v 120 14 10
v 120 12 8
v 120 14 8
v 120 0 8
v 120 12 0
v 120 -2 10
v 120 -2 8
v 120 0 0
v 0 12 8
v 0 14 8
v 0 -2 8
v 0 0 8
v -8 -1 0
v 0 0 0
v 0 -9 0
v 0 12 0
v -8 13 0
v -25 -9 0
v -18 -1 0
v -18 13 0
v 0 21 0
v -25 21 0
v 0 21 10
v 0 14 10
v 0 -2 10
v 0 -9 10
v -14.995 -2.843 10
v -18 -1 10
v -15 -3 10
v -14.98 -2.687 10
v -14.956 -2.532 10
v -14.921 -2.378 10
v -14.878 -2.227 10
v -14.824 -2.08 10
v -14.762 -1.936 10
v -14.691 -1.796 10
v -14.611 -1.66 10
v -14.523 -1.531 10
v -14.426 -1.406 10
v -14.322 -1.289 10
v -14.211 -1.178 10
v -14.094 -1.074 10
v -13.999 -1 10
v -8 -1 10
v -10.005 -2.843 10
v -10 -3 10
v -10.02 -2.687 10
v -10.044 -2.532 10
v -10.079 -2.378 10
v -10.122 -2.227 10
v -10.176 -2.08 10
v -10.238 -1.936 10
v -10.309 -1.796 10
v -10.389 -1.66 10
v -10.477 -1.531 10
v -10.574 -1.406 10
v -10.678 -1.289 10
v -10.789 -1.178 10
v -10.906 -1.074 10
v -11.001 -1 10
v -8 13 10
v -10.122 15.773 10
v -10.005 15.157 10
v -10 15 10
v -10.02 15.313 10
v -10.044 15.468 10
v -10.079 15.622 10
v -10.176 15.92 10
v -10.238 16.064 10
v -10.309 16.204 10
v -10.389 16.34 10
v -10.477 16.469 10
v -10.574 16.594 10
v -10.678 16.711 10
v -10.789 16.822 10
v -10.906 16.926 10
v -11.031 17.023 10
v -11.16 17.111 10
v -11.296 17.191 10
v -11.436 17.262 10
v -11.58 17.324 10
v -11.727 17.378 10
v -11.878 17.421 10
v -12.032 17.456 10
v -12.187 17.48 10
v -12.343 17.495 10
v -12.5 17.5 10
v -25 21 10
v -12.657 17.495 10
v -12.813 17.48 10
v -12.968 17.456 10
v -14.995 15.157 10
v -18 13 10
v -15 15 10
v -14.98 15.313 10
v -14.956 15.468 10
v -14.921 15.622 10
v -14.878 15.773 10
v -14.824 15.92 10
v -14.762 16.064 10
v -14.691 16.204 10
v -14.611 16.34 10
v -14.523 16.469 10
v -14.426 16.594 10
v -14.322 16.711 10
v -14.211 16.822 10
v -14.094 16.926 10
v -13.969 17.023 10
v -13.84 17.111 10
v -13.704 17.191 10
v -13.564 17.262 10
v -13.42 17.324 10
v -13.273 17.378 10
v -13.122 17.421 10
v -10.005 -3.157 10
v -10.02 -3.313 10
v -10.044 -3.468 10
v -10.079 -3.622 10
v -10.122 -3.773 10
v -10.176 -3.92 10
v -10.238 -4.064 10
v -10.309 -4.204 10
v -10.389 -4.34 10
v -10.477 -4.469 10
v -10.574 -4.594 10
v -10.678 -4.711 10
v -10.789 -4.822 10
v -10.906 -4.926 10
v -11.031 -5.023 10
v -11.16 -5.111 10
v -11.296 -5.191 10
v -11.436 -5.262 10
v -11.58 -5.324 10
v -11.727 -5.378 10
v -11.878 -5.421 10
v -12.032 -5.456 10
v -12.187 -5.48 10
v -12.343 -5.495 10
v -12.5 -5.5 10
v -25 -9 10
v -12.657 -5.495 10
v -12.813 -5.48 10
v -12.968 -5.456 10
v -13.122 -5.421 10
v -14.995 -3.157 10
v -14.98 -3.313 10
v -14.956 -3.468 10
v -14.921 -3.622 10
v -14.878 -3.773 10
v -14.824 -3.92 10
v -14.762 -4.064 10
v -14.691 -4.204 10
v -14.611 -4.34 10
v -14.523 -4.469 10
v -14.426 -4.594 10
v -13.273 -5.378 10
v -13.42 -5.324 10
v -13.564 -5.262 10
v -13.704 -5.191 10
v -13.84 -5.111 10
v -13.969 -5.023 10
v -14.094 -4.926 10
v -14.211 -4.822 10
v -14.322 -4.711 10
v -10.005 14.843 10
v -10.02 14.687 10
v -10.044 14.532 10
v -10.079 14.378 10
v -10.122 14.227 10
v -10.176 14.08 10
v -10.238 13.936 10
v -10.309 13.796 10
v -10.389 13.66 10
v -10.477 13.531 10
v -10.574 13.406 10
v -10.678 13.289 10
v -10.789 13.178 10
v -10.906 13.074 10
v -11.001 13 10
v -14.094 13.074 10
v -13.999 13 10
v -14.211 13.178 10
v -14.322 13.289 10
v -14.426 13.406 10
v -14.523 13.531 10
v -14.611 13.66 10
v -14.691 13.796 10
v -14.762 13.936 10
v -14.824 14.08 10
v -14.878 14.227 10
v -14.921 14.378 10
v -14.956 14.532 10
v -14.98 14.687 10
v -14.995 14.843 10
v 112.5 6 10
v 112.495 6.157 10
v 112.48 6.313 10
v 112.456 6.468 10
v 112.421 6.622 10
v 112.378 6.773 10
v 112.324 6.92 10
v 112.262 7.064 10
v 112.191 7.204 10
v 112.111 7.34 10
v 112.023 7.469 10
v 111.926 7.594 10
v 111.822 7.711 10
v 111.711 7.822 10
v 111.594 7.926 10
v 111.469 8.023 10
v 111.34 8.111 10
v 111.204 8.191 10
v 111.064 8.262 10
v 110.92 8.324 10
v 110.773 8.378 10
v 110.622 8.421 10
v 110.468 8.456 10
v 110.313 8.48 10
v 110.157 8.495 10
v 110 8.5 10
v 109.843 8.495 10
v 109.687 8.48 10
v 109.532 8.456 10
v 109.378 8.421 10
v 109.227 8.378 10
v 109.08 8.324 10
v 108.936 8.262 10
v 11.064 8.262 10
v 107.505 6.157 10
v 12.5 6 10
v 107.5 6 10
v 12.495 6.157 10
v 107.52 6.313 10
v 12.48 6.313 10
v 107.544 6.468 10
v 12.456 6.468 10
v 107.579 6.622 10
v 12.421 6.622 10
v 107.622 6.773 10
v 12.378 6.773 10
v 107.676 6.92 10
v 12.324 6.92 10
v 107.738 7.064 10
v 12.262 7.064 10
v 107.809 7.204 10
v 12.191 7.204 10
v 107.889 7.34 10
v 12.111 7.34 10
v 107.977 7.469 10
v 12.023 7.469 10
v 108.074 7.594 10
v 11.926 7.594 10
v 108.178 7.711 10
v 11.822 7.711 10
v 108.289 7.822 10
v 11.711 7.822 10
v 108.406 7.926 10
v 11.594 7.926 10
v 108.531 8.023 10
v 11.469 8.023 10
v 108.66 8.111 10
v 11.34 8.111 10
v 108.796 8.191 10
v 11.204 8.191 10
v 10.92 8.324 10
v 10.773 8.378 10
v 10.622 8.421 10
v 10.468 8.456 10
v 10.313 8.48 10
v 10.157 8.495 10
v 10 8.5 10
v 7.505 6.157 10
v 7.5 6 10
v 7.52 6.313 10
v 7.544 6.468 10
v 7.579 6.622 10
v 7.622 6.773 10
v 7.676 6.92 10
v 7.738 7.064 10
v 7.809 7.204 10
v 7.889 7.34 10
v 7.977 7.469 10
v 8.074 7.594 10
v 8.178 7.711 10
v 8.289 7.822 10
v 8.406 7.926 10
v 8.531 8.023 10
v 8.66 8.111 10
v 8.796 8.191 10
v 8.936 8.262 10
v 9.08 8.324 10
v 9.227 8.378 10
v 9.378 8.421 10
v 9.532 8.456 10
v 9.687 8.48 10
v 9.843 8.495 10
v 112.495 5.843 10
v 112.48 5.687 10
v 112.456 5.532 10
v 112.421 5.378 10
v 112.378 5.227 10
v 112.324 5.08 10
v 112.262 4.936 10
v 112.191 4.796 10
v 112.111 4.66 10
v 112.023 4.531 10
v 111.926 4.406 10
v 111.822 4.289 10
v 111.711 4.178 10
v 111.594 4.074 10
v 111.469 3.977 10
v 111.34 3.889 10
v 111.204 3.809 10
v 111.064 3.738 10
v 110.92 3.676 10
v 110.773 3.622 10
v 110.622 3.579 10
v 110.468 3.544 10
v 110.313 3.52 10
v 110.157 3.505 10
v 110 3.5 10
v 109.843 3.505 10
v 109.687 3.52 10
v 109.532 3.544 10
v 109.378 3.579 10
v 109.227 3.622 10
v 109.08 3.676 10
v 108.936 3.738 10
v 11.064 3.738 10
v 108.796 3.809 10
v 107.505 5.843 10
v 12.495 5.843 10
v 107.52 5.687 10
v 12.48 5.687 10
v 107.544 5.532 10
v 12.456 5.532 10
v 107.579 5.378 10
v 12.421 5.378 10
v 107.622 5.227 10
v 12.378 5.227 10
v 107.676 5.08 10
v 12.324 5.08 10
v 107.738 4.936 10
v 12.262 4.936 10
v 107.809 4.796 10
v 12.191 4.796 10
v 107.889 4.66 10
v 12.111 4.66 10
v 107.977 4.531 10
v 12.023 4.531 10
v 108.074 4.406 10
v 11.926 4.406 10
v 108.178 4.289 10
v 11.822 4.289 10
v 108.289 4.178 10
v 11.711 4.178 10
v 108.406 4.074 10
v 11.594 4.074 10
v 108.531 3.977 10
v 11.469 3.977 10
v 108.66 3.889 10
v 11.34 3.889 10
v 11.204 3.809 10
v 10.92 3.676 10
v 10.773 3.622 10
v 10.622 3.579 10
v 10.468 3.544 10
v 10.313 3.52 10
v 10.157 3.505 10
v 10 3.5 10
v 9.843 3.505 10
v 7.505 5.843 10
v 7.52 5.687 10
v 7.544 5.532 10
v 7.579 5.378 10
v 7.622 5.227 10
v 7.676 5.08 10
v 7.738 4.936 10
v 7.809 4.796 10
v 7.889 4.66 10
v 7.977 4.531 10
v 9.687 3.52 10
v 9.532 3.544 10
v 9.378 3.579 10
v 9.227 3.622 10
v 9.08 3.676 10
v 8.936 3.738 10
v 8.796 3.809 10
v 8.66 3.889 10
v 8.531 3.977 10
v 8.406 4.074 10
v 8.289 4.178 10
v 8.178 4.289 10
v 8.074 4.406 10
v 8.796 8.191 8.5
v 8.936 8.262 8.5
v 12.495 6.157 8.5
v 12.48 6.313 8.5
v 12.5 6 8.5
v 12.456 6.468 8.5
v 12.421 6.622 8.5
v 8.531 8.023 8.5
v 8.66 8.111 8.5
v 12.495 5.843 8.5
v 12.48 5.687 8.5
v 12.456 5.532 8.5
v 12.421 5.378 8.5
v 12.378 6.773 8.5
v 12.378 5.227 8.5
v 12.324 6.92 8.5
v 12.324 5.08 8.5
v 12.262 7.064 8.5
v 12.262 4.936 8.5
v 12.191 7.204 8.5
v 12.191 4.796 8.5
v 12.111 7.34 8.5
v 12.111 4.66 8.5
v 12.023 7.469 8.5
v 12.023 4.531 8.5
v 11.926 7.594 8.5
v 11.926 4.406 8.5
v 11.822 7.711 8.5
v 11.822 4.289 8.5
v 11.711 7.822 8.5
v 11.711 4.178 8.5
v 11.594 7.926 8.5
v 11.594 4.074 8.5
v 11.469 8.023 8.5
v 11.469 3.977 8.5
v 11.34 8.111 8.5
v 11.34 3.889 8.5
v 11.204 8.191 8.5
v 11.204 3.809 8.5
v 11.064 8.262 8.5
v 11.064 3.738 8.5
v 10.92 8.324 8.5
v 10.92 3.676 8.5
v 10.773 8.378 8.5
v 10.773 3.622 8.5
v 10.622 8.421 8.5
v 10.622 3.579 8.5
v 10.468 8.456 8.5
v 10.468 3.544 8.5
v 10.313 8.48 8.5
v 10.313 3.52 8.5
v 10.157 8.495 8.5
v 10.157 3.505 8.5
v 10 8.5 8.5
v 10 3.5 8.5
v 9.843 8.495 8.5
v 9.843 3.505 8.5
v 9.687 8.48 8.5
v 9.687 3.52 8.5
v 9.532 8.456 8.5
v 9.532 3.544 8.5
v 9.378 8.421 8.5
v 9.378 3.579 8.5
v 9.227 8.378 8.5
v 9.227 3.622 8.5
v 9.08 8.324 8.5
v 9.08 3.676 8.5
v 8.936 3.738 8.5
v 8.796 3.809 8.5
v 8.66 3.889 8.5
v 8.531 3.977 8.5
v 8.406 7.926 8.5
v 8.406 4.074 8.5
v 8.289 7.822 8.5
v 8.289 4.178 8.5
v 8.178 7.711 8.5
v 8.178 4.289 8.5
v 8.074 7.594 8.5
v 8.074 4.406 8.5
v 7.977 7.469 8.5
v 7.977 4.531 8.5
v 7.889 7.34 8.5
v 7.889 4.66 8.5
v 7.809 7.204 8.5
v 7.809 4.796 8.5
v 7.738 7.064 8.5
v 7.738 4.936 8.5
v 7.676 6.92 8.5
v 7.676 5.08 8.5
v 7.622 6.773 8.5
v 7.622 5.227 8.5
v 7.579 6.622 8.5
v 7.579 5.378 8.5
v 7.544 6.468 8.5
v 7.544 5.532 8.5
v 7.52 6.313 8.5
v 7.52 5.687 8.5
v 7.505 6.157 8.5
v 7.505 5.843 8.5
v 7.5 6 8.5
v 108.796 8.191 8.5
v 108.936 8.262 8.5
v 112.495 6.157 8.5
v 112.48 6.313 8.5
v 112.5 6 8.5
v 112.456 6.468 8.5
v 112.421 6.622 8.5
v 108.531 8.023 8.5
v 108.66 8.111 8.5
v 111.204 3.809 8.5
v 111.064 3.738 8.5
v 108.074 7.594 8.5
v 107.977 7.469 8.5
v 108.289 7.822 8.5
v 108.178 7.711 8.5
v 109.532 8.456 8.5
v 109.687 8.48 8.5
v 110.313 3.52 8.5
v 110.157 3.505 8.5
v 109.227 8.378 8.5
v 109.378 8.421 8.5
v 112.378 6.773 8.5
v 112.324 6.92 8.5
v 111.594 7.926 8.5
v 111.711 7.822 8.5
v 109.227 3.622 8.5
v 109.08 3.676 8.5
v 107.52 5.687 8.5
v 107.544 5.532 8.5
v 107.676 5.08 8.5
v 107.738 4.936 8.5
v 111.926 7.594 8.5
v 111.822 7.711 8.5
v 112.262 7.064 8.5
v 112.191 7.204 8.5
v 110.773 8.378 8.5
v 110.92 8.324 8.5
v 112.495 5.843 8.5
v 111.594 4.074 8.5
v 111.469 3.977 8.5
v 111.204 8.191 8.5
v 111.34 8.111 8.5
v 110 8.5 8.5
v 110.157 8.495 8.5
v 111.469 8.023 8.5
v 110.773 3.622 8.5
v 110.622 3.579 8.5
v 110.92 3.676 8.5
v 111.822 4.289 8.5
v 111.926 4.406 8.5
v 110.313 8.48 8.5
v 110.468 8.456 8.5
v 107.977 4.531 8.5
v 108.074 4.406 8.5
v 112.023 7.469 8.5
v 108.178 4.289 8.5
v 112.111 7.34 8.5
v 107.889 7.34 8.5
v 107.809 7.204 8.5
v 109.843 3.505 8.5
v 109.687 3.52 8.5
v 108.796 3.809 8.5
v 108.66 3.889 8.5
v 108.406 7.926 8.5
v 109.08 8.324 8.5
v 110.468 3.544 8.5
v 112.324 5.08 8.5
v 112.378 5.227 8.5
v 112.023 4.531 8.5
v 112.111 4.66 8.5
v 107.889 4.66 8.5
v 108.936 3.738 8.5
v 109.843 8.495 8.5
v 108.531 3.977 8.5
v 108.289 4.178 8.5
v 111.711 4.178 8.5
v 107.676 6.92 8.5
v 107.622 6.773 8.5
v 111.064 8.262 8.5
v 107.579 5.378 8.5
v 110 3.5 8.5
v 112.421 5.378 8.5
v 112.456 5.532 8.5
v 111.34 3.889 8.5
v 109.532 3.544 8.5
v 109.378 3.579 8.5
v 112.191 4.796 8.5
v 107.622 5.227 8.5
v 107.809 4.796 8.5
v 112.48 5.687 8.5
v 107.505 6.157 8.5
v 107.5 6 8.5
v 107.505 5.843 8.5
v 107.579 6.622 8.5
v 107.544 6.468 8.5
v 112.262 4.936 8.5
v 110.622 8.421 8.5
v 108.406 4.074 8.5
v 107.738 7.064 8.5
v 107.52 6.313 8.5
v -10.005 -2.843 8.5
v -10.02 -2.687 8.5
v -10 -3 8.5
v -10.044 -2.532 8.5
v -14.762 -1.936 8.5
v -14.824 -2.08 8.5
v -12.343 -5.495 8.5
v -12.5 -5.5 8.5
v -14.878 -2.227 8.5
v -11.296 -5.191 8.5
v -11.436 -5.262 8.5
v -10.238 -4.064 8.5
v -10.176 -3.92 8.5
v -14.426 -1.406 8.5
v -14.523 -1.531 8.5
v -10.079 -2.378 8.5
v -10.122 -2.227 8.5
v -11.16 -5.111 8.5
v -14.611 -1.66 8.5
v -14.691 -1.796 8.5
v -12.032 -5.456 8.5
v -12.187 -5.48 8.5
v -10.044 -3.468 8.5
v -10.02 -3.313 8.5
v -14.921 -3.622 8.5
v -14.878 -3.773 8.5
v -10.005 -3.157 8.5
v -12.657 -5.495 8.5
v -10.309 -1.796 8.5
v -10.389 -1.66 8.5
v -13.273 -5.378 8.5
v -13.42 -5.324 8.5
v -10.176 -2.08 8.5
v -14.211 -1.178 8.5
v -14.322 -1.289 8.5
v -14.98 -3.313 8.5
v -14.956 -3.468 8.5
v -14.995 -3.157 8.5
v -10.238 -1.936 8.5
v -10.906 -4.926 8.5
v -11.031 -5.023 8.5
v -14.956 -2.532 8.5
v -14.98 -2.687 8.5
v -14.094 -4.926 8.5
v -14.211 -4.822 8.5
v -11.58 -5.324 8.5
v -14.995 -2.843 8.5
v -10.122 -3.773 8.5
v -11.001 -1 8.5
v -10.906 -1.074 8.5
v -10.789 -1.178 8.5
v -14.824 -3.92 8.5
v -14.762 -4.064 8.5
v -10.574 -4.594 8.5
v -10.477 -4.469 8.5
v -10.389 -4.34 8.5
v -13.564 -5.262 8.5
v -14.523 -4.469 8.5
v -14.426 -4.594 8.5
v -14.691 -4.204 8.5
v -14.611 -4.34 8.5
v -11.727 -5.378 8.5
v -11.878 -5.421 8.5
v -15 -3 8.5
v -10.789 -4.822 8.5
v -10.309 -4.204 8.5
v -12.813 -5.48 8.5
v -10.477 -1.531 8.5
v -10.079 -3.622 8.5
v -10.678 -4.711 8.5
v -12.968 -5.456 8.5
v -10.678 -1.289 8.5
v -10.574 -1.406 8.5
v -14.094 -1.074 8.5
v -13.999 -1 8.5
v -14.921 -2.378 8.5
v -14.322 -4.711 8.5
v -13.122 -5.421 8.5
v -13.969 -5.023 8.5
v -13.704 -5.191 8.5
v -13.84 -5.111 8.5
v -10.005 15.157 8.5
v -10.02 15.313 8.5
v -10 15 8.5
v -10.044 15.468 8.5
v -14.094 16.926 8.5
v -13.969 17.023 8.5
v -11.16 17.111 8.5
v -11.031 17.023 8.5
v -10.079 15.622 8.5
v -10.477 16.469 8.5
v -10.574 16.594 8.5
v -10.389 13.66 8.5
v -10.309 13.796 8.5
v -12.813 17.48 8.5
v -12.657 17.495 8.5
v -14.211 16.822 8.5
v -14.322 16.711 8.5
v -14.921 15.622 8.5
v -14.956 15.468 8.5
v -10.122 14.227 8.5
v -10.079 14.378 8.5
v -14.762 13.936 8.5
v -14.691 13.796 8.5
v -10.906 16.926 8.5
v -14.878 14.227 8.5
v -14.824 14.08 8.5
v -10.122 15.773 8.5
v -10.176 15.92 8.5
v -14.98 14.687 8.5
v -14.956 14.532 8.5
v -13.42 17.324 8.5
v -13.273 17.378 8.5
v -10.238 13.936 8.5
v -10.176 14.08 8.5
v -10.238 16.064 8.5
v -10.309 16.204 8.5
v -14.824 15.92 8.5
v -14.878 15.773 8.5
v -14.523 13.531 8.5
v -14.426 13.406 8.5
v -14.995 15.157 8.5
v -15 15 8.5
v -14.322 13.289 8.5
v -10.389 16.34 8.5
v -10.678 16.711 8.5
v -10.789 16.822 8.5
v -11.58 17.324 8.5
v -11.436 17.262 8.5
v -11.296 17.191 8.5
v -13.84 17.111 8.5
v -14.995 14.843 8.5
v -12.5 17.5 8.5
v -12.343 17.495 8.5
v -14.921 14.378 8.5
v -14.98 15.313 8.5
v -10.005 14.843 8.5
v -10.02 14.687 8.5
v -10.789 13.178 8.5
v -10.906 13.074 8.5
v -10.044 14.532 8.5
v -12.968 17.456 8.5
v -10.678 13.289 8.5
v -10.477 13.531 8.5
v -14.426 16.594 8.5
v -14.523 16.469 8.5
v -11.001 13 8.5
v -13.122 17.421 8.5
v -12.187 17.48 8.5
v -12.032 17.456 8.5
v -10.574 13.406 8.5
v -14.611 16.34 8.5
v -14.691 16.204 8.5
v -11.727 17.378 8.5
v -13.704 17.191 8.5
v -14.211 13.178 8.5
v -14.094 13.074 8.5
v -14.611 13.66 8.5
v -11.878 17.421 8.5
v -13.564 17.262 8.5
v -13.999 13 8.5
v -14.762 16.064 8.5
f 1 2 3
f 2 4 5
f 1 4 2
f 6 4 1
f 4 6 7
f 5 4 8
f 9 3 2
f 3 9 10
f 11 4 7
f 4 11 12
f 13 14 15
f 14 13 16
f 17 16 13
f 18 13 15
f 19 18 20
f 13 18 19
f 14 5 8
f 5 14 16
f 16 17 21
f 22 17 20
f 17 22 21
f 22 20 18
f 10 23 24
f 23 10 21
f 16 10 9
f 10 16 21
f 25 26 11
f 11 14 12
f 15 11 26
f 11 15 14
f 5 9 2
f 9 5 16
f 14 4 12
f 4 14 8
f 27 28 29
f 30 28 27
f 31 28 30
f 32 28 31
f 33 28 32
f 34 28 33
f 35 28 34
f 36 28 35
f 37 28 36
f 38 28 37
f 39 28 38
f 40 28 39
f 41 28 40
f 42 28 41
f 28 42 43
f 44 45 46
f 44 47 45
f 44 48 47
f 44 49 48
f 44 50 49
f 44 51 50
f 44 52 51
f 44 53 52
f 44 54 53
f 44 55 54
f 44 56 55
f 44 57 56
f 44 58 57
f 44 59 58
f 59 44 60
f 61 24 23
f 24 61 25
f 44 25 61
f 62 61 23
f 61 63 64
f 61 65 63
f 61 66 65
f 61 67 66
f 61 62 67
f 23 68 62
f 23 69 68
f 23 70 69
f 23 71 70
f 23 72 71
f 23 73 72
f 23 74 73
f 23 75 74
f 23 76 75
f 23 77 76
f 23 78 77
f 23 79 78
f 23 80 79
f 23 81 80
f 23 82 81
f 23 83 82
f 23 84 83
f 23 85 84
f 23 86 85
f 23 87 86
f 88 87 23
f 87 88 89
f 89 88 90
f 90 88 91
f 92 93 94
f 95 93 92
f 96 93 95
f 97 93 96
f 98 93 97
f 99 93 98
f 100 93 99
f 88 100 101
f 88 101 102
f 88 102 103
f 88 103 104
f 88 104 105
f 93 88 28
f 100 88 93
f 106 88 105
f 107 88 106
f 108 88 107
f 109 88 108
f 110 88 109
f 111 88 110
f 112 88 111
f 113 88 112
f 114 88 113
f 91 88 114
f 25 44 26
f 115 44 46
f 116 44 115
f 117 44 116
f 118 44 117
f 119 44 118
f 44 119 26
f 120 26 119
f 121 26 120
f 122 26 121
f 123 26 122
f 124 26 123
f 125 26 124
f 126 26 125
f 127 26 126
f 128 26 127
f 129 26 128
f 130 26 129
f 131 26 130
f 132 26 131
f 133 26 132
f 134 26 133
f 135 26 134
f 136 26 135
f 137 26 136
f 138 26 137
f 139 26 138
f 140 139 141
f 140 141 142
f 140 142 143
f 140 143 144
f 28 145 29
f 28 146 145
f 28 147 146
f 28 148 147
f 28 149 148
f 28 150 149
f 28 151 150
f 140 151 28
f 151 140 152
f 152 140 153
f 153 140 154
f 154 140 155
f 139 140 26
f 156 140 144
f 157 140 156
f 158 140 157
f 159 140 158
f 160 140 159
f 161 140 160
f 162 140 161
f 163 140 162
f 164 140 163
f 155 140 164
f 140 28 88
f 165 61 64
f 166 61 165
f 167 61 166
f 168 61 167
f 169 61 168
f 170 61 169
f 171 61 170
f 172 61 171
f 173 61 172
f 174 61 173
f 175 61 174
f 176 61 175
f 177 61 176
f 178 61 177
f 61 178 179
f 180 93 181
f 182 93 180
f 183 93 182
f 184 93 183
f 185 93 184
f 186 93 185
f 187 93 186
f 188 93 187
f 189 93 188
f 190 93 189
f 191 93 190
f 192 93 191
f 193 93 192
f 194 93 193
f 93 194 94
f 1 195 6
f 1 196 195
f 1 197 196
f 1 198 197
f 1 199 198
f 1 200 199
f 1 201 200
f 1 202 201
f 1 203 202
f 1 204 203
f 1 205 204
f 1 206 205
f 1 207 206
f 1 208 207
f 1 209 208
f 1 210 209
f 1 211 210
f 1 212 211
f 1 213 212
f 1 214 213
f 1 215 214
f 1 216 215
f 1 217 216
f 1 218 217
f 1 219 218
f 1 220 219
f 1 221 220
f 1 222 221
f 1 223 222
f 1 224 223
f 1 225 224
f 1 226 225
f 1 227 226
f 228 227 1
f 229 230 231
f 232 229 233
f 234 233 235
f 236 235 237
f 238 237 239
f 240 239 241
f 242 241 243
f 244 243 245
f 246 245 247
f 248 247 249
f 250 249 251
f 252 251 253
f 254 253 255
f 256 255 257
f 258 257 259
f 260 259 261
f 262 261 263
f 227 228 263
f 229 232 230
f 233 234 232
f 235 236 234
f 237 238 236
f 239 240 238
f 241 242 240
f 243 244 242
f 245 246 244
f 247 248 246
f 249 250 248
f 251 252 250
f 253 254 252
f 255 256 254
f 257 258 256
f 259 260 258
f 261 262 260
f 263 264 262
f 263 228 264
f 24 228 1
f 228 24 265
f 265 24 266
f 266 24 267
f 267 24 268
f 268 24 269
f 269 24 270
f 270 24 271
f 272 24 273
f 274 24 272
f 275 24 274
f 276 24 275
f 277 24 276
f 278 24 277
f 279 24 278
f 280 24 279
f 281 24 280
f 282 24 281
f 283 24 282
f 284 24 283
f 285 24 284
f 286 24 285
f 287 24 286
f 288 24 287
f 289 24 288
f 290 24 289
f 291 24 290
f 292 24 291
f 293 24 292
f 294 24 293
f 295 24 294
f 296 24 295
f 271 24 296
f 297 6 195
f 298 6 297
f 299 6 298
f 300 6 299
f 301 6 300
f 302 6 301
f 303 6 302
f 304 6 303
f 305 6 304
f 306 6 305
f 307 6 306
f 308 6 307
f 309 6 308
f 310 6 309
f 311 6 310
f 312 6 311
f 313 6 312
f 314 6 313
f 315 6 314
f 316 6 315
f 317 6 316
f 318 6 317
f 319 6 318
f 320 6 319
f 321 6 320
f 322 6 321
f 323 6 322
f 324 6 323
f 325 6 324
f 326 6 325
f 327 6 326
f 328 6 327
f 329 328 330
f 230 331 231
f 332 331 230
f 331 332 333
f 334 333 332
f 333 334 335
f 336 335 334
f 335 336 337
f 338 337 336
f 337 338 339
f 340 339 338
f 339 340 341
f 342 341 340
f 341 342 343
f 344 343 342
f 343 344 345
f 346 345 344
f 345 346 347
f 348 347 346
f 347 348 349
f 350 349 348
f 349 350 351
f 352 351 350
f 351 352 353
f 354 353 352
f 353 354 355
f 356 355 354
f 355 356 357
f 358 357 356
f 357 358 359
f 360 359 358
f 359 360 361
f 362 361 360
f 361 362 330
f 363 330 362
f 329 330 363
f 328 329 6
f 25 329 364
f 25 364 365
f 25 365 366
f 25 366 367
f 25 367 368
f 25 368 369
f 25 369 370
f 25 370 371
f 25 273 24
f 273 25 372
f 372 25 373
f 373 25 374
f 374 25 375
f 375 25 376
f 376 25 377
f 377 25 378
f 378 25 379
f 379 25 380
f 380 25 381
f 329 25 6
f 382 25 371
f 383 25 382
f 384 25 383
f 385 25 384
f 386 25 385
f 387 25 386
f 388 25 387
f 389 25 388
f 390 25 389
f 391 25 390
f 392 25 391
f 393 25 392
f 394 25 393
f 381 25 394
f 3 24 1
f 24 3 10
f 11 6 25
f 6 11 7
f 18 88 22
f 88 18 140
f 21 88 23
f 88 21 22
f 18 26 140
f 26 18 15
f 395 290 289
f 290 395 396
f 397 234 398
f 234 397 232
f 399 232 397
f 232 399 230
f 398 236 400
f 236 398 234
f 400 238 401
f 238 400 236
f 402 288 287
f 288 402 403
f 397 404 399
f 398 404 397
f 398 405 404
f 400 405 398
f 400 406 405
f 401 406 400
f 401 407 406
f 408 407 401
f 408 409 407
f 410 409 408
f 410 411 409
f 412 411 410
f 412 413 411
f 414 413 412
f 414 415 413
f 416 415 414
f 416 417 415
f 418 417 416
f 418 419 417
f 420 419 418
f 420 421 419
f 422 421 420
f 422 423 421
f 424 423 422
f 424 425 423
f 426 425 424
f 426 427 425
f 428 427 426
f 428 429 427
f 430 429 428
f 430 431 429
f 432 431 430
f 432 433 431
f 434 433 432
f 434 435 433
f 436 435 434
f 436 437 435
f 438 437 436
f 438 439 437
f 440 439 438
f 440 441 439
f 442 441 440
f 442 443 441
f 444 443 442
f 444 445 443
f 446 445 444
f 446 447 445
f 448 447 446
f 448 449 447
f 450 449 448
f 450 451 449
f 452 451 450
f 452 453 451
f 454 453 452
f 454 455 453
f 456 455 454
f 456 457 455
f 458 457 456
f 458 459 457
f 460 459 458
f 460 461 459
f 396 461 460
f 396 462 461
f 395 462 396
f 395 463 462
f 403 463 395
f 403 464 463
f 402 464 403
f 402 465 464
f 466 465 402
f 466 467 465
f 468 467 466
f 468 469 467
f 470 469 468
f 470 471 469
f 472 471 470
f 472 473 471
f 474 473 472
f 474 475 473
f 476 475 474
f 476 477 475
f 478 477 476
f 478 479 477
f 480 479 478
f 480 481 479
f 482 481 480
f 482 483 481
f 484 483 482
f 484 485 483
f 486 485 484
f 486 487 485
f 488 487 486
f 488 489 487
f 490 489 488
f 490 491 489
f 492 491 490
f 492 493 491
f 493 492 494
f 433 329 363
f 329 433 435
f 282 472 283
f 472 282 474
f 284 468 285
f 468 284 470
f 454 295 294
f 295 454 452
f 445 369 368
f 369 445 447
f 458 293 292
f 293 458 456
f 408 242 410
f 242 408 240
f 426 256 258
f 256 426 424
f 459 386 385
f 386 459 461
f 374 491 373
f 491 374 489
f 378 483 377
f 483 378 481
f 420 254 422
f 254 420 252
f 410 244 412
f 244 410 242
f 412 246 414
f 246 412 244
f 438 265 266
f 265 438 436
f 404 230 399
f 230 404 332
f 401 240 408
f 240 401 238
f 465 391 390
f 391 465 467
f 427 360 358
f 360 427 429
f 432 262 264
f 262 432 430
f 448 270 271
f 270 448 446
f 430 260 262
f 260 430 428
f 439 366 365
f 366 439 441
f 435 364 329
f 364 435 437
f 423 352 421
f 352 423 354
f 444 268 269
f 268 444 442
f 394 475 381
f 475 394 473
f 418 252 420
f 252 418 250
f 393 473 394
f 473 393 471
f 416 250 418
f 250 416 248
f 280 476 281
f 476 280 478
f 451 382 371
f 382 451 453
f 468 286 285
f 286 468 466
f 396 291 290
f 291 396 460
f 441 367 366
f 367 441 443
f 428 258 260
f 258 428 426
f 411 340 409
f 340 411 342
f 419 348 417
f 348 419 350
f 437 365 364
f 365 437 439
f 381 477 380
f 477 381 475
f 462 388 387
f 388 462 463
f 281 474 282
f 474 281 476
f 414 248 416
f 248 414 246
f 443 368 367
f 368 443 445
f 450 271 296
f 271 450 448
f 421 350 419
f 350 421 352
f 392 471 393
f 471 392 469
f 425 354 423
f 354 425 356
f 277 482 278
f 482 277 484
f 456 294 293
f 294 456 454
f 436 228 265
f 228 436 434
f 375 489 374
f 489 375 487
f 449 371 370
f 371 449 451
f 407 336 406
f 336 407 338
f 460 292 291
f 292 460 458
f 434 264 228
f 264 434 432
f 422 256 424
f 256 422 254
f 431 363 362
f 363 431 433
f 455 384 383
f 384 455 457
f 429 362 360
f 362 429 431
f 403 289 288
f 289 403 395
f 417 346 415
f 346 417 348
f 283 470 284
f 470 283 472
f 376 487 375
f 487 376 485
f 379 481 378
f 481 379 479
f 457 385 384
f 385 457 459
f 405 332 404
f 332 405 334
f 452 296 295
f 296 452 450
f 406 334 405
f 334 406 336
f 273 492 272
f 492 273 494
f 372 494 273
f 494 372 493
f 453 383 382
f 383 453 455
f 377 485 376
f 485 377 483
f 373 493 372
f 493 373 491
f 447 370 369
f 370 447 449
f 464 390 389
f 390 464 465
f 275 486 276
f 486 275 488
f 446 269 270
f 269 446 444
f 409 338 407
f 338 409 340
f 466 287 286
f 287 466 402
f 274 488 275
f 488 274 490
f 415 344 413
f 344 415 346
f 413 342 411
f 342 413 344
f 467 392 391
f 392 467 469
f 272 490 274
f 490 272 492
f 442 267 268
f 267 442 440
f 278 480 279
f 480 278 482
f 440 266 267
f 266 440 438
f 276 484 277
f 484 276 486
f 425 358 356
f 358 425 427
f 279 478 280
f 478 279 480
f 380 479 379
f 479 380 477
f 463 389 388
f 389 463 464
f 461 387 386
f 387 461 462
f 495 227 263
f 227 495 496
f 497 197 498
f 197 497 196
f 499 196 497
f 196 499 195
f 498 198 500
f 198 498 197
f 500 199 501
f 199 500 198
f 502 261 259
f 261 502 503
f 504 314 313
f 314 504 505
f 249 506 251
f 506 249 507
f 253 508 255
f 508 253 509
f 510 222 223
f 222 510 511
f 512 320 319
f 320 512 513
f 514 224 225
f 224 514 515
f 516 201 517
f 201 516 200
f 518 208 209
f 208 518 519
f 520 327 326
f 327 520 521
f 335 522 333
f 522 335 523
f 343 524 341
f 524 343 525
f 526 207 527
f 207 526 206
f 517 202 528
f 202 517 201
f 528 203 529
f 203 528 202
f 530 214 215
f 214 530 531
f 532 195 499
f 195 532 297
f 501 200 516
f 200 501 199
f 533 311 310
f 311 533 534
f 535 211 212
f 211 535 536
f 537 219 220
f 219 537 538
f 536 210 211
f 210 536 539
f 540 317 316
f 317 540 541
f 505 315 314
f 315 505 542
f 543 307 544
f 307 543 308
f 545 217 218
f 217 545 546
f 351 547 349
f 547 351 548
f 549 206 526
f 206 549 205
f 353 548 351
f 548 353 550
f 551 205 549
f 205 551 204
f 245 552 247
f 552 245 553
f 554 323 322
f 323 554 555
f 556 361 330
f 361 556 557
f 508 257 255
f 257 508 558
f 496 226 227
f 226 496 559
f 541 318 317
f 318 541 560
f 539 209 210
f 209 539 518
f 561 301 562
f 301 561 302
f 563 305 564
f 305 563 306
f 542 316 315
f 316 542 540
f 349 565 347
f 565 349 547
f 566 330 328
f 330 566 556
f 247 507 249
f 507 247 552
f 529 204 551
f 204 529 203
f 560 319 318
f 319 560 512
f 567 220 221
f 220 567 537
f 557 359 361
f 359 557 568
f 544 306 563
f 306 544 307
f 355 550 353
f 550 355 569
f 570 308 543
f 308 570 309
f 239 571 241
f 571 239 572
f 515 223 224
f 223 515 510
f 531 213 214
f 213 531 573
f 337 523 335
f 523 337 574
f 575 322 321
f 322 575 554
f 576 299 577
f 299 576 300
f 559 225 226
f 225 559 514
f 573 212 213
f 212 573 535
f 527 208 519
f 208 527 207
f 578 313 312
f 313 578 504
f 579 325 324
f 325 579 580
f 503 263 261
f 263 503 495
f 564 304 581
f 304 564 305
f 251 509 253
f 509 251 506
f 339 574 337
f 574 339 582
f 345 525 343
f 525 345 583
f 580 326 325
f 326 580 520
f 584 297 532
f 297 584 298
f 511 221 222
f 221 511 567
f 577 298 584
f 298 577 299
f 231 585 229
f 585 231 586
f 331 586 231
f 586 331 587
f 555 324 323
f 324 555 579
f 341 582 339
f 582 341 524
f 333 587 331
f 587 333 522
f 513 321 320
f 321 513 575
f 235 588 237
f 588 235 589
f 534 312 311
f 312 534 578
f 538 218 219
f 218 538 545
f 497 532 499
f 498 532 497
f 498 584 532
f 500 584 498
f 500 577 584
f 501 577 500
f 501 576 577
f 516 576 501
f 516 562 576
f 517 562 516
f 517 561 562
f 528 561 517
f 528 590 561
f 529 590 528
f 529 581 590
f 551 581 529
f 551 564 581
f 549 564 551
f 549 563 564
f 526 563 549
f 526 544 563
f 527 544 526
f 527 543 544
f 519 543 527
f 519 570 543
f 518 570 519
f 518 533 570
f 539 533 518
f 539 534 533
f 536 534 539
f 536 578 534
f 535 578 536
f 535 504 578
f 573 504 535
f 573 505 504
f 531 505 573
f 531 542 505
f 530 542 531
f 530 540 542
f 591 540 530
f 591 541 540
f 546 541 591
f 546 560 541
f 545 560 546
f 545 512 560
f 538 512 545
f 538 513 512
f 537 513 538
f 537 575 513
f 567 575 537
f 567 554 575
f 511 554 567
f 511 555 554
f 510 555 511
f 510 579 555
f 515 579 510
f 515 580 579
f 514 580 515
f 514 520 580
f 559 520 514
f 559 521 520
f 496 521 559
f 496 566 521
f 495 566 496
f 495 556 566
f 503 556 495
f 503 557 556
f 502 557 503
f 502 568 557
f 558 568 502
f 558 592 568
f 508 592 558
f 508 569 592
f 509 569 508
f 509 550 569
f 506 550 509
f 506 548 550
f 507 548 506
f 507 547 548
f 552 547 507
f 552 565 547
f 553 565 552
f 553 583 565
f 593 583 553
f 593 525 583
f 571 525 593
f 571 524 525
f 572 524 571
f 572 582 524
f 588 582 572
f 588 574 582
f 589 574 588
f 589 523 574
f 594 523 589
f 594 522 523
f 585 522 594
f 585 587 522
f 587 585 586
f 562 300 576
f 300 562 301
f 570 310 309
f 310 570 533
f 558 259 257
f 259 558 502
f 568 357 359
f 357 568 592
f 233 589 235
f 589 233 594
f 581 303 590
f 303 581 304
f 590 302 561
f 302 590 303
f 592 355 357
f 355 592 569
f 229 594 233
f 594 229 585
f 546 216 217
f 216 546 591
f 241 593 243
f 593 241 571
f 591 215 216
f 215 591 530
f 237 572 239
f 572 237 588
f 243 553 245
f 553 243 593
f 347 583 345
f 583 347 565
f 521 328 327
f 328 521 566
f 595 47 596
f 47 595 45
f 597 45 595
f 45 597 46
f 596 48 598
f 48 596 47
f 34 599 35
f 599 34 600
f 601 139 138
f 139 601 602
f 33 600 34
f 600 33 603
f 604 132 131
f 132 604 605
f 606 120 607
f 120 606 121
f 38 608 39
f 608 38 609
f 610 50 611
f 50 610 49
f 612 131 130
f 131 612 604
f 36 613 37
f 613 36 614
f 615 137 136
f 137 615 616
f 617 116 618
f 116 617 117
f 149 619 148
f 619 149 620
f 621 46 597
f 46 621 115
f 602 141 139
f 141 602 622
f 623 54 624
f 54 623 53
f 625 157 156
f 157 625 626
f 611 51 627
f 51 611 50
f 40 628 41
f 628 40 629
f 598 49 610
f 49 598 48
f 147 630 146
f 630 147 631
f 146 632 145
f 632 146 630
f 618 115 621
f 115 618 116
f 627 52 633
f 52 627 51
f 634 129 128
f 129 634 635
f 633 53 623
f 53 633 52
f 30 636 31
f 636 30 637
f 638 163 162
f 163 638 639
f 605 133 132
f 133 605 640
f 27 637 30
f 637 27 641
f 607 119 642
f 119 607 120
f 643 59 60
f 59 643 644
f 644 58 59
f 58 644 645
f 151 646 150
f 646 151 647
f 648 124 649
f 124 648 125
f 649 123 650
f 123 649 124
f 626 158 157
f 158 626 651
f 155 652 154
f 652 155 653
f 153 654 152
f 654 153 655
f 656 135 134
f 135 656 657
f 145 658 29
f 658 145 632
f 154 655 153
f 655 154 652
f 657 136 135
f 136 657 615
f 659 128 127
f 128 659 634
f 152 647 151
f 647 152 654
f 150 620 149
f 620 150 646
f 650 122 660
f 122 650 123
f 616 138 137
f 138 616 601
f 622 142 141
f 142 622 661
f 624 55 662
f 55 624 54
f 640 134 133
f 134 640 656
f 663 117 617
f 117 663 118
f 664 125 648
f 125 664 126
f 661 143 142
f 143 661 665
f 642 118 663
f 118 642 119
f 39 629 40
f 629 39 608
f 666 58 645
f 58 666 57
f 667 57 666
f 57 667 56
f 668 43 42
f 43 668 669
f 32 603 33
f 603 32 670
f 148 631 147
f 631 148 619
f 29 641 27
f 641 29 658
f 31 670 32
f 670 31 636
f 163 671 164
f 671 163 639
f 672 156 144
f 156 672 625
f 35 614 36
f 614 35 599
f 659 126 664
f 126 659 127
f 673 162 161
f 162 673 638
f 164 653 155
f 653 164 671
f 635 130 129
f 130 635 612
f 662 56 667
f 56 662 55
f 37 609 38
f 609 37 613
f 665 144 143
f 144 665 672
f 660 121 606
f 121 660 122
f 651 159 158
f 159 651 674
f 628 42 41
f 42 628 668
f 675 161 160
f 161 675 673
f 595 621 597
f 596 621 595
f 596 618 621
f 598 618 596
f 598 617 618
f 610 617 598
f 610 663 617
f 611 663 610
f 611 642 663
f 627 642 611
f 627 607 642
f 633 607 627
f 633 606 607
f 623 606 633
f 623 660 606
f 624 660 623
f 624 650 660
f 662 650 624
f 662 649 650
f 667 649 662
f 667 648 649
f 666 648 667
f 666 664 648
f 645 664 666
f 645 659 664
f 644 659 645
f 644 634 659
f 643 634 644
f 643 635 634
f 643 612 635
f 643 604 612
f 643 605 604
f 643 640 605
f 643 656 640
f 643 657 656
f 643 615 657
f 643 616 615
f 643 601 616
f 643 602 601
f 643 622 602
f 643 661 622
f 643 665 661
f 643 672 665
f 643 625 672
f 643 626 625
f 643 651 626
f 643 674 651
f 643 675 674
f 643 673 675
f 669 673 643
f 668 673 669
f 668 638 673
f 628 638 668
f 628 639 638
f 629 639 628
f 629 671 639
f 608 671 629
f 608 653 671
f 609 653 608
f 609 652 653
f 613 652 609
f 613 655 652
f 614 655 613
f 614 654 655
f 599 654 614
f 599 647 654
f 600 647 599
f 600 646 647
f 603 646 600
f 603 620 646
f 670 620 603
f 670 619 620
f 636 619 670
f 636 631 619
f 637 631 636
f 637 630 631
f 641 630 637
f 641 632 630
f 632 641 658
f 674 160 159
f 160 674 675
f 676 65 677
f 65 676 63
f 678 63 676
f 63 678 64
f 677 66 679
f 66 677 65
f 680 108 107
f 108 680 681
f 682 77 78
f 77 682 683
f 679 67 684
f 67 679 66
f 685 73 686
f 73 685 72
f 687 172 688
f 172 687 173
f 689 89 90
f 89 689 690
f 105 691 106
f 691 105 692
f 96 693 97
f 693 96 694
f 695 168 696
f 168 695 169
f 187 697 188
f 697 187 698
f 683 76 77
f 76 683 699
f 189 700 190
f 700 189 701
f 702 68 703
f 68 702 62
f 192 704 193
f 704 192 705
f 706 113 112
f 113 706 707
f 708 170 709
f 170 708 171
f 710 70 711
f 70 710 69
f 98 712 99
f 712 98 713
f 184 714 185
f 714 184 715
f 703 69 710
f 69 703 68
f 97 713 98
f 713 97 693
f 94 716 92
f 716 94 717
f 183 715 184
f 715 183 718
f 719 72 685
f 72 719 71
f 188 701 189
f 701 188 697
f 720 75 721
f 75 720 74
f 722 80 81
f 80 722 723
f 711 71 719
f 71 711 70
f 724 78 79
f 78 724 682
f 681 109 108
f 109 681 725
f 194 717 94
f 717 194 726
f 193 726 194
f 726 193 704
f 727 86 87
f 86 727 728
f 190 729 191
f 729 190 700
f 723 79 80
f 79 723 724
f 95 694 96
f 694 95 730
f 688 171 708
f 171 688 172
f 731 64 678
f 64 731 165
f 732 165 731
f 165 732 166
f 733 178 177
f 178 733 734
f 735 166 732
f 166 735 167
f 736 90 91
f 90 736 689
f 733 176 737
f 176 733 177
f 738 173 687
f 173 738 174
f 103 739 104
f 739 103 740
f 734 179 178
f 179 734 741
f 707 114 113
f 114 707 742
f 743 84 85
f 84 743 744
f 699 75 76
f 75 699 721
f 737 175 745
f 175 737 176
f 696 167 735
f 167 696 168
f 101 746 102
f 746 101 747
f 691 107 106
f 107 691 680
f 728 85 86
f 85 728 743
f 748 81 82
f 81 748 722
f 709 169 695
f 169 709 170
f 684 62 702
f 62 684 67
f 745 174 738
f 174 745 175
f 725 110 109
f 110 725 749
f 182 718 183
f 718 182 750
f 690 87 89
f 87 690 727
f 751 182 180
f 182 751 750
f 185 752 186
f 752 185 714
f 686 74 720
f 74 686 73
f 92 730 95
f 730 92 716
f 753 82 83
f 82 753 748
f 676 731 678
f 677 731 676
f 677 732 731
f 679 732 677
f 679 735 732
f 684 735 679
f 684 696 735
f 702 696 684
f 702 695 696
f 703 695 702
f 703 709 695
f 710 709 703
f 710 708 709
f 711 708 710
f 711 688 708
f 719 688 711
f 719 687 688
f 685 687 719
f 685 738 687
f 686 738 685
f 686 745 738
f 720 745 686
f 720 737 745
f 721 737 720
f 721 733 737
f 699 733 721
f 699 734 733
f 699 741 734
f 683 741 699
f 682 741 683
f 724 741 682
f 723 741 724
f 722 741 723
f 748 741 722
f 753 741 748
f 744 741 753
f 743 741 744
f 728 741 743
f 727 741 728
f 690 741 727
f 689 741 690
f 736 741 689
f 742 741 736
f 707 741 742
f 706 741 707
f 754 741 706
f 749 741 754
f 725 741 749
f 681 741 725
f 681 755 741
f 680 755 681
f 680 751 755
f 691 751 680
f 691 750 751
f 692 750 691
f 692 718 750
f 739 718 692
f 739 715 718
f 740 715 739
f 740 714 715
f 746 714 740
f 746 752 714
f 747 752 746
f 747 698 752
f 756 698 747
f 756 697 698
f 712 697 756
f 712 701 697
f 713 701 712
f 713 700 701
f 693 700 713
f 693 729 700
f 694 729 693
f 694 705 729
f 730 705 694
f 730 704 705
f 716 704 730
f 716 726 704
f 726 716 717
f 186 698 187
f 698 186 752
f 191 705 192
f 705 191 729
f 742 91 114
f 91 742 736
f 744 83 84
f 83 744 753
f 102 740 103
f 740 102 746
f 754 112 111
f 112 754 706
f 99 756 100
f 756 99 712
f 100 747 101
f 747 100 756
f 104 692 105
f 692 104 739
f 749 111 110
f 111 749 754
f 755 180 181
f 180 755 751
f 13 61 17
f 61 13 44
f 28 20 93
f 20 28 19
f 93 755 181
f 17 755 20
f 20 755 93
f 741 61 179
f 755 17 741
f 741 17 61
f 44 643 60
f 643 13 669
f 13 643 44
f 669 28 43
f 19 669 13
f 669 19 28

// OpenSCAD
// === Parameters ===

// Rail dimensions
rail_length = 120;          // Full length of the slim rail
rail_body_width = 12;       // Narrow width of the rail body
rail_body_height = 8;       // Height of the rail lower body
top_layer_height = 2;       // Shallow full-length top layer height
top_layer_overhang = 2;     // Top layer overhang beyond body on each side

// End block dimensions
end_block_length = 25;      // Length of the wider end block extension
end_block_width = 30;       // Width of the end block

// Shallow circular recess parameters
recess_diameter = 5;        // Diameter of shallow circular recesses
recess_depth = 1.5;         // Depth of shallow recesses into top layer

// Deep cutout parameters on end block
deep_cutout_width = 14;     // Width of the deep through-cutout
deep_cutout_length = 10;    // Length of the deep through-cutout
deep_cutout_x_offset = 8;   // X offset of cutout from outer edge of end block

$fn = 100;

// Computed values
top_layer_width = rail_body_width + 2 * top_layer_overhang;
total_height = rail_body_height + top_layer_height;
y_center_rail = rail_body_width / 2;
y_offset_block = -(end_block_width - rail_body_width) / 2;

// === Modules ===

// Rail body: narrow lower strip + wider shallow top layer
module rail_solid() {
    // Lower narrow body strip
    cube([rail_length, rail_body_width, rail_body_height]);
    // Full-length shallow top layer (wider than body)
    translate([0, -top_layer_overhang, rail_body_height])
        cube([rail_length, top_layer_width, top_layer_height]);
}

// End block: wider body + matching shallow top layer
module end_block_solid() {
    // Wider block body extending from x=0 end
    translate([-end_block_length, y_offset_block, 0])
        cube([end_block_length, end_block_width, rail_body_height]);
    // Matching shallow top layer on end block
    translate([-end_block_length, y_offset_block, rail_body_height])
        cube([end_block_length, end_block_width, top_layer_height]);
}

// Shallow circular recesses near rail ends (along narrow band)
module rail_recesses() {
    // Near end-block end of rail
    translate([10, y_center_rail, total_height - recess_depth])
        cylinder(h=recess_depth + 0.1, d=recess_diameter);
    // Near far end of rail
    translate([rail_length - 10, y_center_rail, total_height - recess_depth])
        cylinder(h=recess_depth + 0.1, d=recess_diameter);
}

// End block removed features: shallow recesses + deep through-cutout
module end_block_recesses() {
    // Shallow circular recess on end block (near one edge)
    translate([-end_block_length / 2, y_offset_block + 6, total_height - recess_depth])
        cylinder(h=recess_depth + 0.1, d=recess_diameter);
    // Shallow circular recess on end block (near opposite edge)
    translate([-end_block_length / 2, y_offset_block + end_block_width - 6, total_height - recess_depth])
        cylinder(h=recess_depth + 0.1, d=recess_diameter);

    // Deep cutout: goes through the entire body and below, creating stepped depth
    // Positioned toward the outer end of the block
    translate([
        -deep_cutout_x_offset - deep_cutout_length,
        y_offset_block + (end_block_width - deep_cutout_width) / 2,
        -2   // extends below z=0 to ensure through-and-below cut
    ])
        cube([deep_cutout_length, deep_cutout_width, total_height + 4]);
}

// === Main Model ===
difference() {
    // Combine rail and end block solids
    union() {
        rail_solid();
        end_block_solid();
    }

    // Subtract all removed features
    rail_recesses();
    end_block_recesses();
}
